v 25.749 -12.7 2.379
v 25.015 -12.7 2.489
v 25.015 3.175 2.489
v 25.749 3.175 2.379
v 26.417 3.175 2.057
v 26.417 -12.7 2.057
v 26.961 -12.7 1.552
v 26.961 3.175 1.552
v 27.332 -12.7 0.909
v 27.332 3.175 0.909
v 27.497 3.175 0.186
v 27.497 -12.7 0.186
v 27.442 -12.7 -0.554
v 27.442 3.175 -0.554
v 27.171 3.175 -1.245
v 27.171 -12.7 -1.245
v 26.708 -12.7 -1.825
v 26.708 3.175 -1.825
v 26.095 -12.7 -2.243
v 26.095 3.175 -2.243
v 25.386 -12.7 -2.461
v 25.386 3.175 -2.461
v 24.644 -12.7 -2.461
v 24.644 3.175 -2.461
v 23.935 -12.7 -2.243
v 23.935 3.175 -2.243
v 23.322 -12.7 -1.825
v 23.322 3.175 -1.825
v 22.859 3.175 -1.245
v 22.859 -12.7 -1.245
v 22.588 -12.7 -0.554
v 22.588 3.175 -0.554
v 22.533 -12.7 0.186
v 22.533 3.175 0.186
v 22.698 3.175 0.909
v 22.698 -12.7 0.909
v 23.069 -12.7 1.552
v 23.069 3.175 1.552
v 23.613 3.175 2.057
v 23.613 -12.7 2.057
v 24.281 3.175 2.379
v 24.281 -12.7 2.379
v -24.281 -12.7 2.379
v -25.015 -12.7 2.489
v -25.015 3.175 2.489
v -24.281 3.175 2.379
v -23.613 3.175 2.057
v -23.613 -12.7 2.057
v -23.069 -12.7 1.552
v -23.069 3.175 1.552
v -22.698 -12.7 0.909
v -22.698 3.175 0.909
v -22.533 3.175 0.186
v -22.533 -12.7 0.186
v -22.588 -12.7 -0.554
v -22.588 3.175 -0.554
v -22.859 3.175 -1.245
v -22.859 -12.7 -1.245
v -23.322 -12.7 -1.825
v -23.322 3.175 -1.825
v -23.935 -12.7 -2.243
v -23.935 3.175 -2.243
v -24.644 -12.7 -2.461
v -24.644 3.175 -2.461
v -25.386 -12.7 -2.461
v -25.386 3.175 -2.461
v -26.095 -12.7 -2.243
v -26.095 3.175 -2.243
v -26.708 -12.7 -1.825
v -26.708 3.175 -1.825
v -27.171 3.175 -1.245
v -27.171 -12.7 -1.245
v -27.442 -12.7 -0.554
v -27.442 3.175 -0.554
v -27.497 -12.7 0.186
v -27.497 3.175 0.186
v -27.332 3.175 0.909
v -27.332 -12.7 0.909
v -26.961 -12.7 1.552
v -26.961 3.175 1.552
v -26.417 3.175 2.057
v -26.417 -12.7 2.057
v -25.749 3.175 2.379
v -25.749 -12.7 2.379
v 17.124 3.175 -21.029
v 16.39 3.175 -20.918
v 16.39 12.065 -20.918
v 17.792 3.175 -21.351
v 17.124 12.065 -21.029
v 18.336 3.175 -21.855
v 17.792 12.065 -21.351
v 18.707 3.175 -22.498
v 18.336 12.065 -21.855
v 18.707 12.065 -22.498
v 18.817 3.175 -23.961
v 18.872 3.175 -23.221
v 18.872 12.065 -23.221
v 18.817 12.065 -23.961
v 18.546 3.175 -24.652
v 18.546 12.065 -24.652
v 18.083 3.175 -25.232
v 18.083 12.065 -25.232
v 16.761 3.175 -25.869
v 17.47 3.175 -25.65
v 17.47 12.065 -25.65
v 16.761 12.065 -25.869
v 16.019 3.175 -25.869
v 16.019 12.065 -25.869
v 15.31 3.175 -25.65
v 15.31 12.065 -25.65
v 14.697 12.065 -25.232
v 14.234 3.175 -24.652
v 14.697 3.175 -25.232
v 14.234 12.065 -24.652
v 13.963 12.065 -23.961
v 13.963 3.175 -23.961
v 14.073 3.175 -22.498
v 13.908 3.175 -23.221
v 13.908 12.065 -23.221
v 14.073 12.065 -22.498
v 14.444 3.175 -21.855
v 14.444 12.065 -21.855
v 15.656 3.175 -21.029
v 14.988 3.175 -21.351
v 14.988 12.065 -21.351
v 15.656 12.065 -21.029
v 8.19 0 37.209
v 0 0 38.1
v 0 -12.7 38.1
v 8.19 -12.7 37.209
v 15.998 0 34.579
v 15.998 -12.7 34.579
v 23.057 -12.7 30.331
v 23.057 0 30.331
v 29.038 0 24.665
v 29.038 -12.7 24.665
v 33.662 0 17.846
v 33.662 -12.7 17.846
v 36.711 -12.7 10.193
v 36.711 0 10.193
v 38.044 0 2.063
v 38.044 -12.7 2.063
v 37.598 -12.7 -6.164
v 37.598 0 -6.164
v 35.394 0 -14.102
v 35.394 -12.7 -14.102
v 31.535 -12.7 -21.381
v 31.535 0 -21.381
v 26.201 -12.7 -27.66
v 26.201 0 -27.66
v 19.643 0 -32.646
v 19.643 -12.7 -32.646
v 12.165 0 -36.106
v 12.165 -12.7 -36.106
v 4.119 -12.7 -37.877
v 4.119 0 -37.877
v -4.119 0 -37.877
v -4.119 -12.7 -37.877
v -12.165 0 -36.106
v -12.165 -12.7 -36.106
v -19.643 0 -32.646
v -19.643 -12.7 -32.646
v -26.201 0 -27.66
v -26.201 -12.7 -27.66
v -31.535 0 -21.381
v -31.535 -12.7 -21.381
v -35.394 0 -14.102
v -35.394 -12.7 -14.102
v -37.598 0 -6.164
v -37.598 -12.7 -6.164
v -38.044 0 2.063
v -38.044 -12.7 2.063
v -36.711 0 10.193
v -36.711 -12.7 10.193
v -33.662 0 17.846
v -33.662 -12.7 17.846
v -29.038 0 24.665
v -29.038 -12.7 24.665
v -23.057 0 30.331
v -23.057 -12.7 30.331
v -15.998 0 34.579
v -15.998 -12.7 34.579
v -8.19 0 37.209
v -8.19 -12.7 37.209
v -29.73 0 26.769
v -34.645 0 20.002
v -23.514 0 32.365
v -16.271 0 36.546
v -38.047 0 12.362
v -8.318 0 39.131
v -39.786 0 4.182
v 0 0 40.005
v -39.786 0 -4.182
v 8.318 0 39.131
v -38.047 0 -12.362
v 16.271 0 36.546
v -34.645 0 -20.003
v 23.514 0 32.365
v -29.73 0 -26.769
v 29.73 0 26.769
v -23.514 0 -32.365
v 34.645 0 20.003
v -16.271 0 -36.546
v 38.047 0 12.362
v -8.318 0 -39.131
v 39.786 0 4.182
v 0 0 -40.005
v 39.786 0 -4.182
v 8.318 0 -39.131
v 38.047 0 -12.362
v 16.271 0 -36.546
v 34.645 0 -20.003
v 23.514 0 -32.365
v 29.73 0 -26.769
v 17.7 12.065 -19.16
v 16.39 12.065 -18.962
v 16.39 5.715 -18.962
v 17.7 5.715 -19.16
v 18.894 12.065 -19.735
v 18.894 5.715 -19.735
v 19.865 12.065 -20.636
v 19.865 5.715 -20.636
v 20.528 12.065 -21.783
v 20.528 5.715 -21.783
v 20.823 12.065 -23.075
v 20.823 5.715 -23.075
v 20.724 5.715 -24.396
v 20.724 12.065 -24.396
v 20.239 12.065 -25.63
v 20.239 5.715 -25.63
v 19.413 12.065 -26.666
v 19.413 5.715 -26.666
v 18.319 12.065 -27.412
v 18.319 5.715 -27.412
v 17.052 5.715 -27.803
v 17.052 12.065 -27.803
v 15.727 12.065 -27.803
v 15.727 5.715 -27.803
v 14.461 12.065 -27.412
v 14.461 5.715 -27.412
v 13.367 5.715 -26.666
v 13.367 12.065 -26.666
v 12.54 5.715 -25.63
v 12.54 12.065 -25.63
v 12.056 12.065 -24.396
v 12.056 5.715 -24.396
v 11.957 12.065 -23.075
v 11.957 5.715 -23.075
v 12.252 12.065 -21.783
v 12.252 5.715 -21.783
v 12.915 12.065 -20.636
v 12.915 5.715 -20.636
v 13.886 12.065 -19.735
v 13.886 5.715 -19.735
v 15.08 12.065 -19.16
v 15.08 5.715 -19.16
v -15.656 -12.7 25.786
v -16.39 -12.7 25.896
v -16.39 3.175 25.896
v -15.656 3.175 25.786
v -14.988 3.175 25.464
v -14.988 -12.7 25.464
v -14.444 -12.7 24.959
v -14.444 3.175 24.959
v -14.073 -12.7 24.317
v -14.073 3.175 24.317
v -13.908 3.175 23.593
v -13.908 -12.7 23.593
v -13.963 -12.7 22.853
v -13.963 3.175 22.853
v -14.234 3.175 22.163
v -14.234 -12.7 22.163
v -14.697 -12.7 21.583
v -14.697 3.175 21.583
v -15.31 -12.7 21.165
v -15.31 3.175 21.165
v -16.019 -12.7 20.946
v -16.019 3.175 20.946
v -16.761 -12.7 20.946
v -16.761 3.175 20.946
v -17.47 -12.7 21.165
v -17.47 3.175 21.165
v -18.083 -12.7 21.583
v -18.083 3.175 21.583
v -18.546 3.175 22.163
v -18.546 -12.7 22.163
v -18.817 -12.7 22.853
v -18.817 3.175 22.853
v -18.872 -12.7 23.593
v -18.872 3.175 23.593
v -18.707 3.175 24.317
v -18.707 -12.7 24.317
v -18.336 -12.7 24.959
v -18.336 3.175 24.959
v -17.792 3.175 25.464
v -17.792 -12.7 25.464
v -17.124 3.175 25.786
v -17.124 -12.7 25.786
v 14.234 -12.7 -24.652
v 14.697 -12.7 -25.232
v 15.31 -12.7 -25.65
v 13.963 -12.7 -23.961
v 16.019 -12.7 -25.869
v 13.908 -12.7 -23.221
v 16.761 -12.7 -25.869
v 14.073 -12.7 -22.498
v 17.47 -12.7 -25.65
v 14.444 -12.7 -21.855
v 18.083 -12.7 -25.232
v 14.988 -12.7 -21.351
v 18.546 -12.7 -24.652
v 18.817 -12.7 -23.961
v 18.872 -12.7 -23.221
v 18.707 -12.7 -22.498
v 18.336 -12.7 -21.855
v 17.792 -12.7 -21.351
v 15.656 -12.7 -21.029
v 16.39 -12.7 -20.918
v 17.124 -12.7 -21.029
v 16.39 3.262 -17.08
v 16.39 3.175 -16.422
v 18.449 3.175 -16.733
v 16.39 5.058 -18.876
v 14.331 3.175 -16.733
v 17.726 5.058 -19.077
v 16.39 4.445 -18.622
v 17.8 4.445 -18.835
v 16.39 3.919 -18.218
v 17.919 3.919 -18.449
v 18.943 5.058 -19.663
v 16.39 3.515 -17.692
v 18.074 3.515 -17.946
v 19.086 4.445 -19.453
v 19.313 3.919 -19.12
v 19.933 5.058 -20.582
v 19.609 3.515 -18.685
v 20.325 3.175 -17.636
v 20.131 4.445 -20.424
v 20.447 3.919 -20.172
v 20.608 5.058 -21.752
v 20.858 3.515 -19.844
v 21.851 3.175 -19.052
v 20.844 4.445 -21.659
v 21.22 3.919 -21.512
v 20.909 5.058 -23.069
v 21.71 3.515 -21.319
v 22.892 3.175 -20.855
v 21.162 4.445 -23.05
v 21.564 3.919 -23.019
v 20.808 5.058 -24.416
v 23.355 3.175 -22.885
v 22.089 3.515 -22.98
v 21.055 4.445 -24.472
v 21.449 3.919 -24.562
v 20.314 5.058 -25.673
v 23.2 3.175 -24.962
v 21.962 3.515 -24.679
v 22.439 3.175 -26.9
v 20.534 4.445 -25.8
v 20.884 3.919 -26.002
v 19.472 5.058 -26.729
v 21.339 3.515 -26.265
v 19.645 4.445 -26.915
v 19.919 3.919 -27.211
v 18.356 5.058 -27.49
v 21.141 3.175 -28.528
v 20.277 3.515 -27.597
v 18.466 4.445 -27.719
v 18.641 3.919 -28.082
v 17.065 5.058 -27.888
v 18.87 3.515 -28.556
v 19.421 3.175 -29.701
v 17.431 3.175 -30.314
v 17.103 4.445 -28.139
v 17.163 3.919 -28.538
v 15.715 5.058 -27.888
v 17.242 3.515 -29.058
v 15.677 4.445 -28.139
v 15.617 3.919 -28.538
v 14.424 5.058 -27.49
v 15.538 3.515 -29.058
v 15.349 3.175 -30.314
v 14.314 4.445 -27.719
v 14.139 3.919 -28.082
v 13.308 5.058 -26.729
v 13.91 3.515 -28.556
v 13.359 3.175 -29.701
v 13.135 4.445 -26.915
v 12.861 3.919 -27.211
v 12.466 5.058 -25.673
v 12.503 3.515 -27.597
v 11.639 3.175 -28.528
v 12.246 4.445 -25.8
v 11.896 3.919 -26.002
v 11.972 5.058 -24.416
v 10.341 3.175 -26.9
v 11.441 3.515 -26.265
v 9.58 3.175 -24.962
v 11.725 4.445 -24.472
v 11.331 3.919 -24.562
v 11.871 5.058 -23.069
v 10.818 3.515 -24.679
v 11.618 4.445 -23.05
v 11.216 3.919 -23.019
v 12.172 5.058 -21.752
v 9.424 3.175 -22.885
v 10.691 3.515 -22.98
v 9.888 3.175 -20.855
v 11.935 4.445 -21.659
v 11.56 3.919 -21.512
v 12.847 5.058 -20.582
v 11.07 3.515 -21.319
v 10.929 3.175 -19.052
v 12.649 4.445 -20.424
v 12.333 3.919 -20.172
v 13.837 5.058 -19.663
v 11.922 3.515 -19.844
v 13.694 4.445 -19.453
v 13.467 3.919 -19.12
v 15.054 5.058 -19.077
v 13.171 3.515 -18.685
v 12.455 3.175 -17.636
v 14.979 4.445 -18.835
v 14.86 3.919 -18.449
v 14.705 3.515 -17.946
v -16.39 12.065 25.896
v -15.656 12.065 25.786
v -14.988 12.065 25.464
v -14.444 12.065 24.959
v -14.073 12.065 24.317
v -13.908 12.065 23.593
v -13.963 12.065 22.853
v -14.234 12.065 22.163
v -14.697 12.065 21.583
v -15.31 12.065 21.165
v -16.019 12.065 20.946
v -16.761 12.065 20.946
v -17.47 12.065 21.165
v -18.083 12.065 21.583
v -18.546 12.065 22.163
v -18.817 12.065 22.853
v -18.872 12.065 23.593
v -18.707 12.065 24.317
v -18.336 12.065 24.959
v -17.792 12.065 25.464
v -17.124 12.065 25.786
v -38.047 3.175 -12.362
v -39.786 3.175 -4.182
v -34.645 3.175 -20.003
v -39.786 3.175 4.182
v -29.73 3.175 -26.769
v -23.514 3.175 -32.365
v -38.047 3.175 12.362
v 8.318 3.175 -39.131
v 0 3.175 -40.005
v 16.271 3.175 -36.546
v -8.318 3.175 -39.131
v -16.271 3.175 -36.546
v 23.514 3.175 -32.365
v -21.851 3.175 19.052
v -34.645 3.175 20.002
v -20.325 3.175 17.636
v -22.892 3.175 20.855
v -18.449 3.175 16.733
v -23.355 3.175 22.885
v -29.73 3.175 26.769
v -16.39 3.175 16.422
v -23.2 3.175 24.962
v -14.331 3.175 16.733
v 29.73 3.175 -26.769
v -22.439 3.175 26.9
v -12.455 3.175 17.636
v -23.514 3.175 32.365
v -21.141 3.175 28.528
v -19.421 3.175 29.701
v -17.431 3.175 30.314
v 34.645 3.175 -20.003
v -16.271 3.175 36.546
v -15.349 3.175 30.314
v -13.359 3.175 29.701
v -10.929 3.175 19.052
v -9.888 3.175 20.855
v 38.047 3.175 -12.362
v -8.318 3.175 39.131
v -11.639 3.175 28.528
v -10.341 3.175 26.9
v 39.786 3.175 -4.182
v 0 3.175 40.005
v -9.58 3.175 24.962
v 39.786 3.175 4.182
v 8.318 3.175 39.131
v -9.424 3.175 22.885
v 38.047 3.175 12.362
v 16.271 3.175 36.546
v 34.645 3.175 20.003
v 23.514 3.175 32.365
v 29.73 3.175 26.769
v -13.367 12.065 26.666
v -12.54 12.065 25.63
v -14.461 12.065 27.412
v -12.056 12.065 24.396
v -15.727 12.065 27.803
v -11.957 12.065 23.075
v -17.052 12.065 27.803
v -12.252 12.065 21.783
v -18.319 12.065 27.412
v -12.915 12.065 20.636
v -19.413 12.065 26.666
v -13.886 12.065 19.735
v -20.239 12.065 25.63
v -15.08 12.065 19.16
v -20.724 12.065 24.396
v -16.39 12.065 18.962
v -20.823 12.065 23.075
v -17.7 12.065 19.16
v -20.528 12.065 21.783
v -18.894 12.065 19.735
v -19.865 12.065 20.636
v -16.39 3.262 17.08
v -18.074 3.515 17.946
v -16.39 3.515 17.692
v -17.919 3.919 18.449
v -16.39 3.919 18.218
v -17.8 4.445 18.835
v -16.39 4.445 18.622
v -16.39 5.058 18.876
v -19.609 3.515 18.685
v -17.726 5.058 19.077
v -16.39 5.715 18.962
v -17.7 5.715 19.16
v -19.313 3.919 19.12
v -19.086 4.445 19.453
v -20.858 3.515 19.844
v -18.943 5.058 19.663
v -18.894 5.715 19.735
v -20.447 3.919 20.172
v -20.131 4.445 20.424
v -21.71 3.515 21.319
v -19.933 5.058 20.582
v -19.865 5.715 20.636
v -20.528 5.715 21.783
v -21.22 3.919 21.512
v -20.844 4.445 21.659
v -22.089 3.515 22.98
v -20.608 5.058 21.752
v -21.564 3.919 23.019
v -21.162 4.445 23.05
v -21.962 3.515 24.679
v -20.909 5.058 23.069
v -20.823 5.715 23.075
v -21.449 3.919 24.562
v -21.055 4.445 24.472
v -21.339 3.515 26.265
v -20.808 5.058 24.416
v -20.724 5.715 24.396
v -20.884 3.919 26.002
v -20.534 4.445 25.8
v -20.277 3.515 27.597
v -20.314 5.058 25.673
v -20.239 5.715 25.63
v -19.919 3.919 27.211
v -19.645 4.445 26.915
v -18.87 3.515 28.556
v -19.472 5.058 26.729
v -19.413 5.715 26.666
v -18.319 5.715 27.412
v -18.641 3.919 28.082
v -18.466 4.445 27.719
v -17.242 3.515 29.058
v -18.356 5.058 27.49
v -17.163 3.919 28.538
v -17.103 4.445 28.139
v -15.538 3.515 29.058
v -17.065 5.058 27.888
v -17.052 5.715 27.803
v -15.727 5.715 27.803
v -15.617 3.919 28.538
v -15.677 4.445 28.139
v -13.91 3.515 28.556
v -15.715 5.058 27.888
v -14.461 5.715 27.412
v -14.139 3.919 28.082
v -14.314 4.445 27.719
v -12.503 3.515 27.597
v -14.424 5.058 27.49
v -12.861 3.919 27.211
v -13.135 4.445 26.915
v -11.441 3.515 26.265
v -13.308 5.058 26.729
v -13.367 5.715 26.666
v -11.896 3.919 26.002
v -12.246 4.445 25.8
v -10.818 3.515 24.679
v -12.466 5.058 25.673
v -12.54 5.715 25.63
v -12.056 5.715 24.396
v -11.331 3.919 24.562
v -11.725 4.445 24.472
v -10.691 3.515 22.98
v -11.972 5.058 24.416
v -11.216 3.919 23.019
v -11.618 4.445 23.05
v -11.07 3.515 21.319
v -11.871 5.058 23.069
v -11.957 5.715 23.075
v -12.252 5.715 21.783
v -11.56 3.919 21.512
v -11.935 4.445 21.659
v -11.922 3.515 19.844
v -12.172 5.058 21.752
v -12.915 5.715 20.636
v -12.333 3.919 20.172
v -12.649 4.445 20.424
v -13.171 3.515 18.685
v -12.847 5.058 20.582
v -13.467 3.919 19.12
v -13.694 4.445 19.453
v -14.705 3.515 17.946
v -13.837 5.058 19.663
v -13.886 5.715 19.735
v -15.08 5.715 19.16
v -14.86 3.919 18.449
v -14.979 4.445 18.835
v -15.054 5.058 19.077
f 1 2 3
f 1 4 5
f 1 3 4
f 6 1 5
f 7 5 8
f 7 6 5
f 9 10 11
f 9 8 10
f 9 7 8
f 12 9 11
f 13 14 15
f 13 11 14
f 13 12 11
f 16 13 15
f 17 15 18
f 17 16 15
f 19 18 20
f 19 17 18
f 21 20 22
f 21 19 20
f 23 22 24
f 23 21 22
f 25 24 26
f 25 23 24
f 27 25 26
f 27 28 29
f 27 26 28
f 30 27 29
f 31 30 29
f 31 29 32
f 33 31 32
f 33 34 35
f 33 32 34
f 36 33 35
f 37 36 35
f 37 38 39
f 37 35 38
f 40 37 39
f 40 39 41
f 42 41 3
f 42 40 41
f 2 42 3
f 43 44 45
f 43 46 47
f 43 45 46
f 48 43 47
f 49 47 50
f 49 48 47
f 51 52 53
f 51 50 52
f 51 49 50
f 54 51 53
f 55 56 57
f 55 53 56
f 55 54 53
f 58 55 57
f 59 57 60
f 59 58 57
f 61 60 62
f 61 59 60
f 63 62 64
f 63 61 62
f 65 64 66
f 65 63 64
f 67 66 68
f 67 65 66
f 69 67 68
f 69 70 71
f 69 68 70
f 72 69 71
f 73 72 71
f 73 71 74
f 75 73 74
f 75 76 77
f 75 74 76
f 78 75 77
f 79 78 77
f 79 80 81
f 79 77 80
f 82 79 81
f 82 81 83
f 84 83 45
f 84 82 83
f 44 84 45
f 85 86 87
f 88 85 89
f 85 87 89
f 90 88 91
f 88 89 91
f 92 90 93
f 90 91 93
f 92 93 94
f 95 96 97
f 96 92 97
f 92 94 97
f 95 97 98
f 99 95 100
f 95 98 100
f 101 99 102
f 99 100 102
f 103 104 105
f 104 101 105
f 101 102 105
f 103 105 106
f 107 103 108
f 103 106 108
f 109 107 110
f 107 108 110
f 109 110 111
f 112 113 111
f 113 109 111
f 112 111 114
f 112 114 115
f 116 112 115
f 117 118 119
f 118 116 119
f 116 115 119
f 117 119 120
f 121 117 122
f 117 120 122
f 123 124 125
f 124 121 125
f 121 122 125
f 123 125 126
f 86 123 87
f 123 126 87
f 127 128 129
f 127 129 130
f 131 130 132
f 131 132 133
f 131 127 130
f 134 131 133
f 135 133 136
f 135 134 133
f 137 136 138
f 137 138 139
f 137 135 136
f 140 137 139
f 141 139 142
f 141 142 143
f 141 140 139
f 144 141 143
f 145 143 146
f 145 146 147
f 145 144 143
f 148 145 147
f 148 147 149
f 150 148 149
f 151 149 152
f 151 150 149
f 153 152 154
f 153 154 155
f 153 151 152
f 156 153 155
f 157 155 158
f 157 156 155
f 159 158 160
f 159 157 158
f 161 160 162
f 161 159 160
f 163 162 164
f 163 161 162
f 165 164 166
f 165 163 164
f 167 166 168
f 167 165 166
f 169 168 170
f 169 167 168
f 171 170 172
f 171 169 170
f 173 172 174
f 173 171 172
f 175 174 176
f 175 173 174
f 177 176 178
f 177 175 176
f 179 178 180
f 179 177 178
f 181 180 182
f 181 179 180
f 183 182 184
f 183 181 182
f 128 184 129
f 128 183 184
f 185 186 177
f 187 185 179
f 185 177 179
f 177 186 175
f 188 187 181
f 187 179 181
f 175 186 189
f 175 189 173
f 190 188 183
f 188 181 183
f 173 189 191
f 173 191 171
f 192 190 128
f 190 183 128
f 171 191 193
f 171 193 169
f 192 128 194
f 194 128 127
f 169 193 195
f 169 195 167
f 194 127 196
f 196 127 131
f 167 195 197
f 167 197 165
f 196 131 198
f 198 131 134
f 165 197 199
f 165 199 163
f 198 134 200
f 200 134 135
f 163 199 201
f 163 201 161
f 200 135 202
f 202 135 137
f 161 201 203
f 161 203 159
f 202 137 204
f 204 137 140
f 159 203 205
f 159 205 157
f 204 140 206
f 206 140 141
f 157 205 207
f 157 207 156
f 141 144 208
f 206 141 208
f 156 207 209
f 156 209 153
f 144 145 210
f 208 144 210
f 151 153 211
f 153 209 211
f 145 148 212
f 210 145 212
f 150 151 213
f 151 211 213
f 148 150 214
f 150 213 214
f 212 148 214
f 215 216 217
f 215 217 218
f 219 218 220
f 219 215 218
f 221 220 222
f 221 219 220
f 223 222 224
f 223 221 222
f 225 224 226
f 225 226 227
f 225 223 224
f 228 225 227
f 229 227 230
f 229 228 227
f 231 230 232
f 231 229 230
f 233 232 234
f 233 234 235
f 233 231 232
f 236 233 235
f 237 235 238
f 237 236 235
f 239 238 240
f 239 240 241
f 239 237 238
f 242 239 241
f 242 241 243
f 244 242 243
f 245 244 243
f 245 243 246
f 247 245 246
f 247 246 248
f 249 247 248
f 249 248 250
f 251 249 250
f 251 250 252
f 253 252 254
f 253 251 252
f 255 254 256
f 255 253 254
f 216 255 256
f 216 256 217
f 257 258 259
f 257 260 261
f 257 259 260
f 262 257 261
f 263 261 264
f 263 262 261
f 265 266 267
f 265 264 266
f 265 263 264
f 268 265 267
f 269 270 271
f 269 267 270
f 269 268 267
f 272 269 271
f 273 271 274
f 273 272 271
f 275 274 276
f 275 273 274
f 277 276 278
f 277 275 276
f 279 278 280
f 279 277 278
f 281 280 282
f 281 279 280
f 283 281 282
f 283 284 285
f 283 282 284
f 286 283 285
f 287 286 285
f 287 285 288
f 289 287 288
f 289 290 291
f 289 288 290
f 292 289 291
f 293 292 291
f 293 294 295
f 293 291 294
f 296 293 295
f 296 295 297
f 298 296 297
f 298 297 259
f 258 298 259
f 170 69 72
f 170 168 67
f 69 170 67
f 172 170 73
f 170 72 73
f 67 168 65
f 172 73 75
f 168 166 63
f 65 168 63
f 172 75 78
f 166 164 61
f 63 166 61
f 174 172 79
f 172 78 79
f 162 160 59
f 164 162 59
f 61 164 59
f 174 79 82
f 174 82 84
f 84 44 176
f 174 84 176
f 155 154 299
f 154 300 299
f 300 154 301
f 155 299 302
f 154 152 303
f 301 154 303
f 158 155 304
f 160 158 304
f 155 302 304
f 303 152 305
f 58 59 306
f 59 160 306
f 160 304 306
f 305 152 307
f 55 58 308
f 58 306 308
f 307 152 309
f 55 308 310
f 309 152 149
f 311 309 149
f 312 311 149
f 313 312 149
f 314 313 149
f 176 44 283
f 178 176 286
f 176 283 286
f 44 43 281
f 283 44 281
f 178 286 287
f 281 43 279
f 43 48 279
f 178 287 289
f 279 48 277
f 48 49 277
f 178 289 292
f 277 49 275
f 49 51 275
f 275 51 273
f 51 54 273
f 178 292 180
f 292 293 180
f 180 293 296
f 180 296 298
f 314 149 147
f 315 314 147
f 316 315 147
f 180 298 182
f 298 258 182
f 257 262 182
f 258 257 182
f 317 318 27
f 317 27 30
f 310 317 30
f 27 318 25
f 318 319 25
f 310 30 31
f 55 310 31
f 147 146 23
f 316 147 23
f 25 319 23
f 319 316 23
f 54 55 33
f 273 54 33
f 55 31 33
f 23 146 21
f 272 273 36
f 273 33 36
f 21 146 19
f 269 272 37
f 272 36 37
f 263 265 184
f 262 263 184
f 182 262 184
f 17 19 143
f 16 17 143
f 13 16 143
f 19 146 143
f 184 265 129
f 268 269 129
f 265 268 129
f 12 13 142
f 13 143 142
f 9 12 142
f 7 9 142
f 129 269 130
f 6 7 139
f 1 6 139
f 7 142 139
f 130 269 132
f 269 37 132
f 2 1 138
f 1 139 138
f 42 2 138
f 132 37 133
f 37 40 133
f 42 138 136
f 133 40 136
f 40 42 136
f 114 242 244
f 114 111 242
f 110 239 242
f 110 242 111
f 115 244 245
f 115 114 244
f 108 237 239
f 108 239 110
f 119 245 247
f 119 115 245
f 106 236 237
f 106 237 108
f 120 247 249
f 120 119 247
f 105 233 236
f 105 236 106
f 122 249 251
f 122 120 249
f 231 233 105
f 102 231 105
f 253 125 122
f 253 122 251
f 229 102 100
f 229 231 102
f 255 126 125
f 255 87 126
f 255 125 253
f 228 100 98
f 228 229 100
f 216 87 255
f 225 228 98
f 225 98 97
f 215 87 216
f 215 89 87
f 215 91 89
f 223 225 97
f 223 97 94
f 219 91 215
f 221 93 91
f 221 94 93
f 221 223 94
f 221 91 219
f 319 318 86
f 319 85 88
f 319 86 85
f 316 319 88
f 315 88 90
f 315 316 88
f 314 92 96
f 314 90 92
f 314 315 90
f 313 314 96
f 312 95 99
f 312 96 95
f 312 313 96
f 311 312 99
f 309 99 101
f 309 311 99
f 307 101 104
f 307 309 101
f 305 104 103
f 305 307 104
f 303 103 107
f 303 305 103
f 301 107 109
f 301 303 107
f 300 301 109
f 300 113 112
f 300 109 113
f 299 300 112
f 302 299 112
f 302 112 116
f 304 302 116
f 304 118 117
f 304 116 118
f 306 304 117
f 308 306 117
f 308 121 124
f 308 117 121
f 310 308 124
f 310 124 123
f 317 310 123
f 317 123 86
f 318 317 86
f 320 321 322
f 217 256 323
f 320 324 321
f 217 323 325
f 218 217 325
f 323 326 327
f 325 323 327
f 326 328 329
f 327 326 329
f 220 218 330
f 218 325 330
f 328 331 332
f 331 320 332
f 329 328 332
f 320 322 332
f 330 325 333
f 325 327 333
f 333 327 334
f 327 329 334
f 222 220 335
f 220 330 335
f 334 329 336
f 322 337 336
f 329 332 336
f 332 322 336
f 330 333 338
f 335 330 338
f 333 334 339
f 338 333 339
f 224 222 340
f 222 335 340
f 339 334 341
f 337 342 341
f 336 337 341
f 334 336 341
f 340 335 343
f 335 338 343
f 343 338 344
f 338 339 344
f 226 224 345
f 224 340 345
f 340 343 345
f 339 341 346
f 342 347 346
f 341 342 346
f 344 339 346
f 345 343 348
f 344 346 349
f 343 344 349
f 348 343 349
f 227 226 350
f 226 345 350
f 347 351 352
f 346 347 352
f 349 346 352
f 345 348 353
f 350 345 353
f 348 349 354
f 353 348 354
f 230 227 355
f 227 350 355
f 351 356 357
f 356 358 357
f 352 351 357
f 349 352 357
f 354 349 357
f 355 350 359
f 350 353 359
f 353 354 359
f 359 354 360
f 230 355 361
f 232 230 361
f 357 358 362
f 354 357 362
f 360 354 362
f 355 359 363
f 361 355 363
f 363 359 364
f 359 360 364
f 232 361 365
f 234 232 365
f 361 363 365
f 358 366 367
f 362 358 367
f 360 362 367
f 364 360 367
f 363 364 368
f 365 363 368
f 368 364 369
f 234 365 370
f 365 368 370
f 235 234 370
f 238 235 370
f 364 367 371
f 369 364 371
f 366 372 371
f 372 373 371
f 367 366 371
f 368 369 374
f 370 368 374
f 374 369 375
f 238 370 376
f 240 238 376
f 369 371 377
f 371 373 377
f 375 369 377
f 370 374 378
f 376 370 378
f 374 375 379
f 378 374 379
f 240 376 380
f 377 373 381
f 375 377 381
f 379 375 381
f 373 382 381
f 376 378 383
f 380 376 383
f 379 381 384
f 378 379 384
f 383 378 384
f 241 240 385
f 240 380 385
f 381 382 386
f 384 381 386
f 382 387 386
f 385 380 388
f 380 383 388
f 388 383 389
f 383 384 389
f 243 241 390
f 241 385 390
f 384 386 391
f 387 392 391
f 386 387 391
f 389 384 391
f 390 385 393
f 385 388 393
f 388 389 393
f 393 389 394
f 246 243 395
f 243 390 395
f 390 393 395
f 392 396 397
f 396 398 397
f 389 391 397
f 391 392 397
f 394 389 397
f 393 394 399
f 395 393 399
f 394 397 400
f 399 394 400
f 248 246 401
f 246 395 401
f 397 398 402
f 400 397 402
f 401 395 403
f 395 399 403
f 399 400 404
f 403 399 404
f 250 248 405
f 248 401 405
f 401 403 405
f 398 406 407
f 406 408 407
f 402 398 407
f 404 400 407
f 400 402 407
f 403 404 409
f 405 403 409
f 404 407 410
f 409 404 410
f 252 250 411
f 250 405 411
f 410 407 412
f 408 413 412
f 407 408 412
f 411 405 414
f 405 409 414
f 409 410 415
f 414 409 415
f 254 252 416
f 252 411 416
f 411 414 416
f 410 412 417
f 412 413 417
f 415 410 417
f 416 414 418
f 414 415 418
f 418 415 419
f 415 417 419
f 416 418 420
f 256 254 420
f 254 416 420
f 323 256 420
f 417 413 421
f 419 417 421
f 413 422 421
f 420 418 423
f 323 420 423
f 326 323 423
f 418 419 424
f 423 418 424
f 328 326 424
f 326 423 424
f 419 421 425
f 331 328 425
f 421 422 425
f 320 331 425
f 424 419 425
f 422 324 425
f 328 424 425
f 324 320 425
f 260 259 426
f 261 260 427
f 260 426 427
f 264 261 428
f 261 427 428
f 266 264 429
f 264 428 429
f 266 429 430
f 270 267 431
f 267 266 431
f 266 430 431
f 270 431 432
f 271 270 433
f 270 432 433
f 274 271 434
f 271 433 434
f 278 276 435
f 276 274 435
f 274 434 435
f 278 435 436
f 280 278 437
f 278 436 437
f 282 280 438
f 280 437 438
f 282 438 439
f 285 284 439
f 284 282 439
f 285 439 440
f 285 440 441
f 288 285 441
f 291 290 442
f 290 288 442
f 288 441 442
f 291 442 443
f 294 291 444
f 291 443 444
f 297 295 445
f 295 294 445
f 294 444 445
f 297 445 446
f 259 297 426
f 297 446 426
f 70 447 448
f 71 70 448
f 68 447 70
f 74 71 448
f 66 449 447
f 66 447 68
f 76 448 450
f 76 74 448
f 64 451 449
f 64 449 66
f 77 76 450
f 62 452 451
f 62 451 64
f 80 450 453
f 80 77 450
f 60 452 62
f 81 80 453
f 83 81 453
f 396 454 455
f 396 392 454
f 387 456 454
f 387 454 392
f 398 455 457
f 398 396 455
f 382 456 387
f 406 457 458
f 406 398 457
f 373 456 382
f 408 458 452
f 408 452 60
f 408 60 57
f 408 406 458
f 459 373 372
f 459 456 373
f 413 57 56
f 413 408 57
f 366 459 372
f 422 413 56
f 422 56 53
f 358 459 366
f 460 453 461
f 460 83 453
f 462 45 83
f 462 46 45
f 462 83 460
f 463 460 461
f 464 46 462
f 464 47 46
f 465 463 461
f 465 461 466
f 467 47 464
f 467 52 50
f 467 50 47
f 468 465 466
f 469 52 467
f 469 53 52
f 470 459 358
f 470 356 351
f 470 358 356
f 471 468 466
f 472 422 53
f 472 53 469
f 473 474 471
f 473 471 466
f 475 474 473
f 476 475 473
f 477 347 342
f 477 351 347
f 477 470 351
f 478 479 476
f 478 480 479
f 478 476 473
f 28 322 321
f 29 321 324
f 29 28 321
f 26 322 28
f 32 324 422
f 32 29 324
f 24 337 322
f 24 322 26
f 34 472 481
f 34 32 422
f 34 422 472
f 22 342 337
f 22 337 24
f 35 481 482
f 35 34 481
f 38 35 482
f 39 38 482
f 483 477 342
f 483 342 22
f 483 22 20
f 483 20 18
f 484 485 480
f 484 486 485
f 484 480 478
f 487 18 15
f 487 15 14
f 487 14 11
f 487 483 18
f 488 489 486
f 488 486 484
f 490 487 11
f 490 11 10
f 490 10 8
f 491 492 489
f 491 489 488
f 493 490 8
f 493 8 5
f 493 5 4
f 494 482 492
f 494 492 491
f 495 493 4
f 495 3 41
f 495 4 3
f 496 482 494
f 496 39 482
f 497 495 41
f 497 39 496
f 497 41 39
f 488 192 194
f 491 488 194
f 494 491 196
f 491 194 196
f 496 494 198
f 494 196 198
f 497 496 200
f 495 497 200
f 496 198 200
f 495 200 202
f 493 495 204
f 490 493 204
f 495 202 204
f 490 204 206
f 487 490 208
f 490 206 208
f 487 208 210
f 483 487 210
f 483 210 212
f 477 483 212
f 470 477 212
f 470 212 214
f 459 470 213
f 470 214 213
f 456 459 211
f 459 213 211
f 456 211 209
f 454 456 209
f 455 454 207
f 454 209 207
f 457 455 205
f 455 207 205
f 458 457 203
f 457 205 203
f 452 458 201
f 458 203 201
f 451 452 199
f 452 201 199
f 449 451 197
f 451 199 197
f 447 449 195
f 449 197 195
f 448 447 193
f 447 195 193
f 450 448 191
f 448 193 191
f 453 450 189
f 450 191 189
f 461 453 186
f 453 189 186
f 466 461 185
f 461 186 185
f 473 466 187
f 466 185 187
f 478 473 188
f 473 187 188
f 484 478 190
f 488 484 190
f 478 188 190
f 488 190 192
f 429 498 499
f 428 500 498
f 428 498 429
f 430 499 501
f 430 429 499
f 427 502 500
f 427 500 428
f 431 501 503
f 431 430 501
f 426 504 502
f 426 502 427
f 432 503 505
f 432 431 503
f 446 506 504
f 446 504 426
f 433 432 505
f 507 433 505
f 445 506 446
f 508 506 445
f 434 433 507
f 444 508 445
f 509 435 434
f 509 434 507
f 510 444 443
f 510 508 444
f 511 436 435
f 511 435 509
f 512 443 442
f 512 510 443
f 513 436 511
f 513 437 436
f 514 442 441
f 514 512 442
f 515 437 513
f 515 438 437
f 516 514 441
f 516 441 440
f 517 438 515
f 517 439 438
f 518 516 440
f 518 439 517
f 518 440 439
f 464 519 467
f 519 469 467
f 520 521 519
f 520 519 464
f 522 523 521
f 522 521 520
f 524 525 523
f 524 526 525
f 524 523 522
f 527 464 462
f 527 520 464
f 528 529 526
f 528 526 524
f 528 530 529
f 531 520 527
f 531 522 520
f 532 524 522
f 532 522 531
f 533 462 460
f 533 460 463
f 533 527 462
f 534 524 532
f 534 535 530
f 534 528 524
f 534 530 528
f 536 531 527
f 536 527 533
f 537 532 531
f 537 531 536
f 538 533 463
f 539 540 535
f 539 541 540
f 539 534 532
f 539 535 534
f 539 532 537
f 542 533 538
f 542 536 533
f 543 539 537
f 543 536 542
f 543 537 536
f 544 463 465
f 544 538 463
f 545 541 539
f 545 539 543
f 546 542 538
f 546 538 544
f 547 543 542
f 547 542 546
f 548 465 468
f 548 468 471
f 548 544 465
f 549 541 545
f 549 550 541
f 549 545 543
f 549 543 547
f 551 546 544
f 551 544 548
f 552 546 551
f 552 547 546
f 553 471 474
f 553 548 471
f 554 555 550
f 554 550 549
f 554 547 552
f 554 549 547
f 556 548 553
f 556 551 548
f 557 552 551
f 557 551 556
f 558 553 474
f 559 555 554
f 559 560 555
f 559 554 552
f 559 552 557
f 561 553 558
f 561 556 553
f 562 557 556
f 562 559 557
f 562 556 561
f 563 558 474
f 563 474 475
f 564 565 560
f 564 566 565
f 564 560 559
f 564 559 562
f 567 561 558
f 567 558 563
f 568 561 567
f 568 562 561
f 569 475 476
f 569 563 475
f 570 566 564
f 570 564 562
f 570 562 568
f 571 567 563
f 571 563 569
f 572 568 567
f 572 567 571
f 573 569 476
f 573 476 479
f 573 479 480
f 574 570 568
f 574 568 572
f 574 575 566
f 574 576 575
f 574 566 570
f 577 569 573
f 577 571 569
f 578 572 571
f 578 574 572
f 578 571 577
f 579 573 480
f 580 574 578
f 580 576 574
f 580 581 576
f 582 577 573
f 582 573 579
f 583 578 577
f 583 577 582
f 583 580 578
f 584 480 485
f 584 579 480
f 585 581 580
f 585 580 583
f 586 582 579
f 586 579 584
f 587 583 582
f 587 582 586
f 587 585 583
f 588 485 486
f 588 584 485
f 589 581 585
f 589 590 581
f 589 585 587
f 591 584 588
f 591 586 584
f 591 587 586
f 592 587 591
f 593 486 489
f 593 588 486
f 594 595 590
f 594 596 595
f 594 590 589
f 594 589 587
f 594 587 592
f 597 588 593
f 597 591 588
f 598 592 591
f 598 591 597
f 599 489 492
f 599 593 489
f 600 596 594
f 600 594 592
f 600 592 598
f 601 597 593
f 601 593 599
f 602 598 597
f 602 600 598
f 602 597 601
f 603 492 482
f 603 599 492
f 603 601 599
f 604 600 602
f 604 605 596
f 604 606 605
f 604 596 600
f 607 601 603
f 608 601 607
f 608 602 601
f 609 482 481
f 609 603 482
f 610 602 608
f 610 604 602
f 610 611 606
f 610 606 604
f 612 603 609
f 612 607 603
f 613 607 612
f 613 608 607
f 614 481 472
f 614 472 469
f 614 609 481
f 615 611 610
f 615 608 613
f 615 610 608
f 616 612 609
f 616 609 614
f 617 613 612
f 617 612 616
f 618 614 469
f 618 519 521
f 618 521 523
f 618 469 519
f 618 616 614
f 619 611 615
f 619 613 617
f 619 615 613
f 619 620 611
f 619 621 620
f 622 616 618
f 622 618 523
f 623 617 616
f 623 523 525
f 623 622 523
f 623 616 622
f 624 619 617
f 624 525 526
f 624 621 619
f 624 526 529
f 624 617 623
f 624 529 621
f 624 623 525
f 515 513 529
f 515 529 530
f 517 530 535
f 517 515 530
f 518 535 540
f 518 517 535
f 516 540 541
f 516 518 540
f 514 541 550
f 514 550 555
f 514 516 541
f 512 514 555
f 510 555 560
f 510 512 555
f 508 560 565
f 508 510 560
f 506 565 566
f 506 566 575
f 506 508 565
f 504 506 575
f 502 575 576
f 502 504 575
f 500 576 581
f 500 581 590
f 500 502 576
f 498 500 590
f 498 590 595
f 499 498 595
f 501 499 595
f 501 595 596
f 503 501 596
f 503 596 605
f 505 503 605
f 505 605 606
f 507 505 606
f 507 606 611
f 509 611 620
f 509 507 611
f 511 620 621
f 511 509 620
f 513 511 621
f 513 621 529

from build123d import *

# Parameters (mm, degrees)
SKETCH1_R               = 40.005
BOSS_EXTRUDE1_DEPTH     = 3.175
SKETCH1_3_R             = 38.1
BOSS_EXTRUDE2_DEPTH     = 12.7
CUT_EXTRUDE1_DEPTH      = 59.760664351
CUT_EXTRUDE1_DEPTH_BACK = 59.760664351
SKETCH3_R               = 2.4892
CUT_EXTRUDE2_DEPTH      = 59.760664351
CUT_EXTRUDE2_DEPTH_BACK = 59.760664351
SKETCH4_R               = 2.4892
BOSS_EXTRUDE3_START     = 8.89
SKETCH4_3_R             = 4.445
SKETCH4_3_R_2           = 2.4892
BOSS_EXTRUDE3_DEPTH     = 8.89
FILLET1_R               = 2.54


with BuildPart() as part:
    # Sketch1 → Boss-Extrude1 (new body)
    with BuildSketch(Plane(origin=(0, 0, 0), x_dir=(1, 0, 0), z_dir=(0, 1, 0))):
        Circle(SKETCH1_R)
    extrude(amount=BOSS_EXTRUDE1_DEPTH)

    # Sketch1<3> → Boss-Extrude2 (add)
    with BuildSketch(Plane(origin=(0, 0, 0), x_dir=(1, 0, 0), z_dir=(0, 1, 0))):
        Circle(SKETCH1_3_R)
    extrude(amount=-BOSS_EXTRUDE2_DEPTH)

    # Sketch3 → Cut-Extrude1 (cut, two sides: drawn at the far end of the back side and taken through both)
    with BuildSketch(Plane(origin=(0, 3.175, 0), x_dir=(1, 0, 0), z_dir=(0, 1, 0)).offset(-CUT_EXTRUDE1_DEPTH_BACK)):
        with Locations((-25.015, 0)):
            Circle(SKETCH3_R)
        with Locations((25.015, 0)):
            Circle(SKETCH3_R)
    extrude(amount=CUT_EXTRUDE1_DEPTH + CUT_EXTRUDE1_DEPTH_BACK, mode=Mode.SUBTRACT)

    # Sketch4 → Cut-Extrude2 (cut, two sides: drawn at the far end of the back side and taken through both)
    with BuildSketch(Plane(origin=(0, 3.175, 0), x_dir=(1, 0, 0), z_dir=(0, 1, 0)).offset(-CUT_EXTRUDE2_DEPTH_BACK)):
        with Locations((16.389946669, 23.407269666)):
            Circle(SKETCH4_R)
        with Locations((-16.389946669, -23.407269666)):
            Circle(SKETCH4_R)
    extrude(amount=CUT_EXTRUDE2_DEPTH + CUT_EXTRUDE2_DEPTH_BACK, mode=Mode.SUBTRACT)

    # Sketch4<3> → Boss-Extrude3 (add)
    # profile 1 of 2: a face of its own
    with BuildSketch(Plane(origin=(0, 3.175, 0), x_dir=(1, 0, 0), z_dir=(0, 1, 0)).offset(BOSS_EXTRUDE3_START)):
        with Locations((16.389946669, 23.407269666)):
            Circle(SKETCH4_3_R)
        with Locations((16.389946669, 23.407269666)):
            Circle(SKETCH4_3_R_2, mode=Mode.SUBTRACT)
    # profile 2 of 2: a face of its own
    with BuildSketch(Plane(origin=(0, 3.175, 0), x_dir=(1, 0, 0), z_dir=(0, 1, 0)).offset(BOSS_EXTRUDE3_START)):
        with Locations((-16.389946669, -23.407269666)):
            Circle(SKETCH4_3_R)
        with Locations((-16.389946669, -23.407269666)):
            Circle(SKETCH4_3_R_2, mode=Mode.SUBTRACT)
    extrude(amount=-BOSS_EXTRUDE3_DEPTH)

    # Fillet1
    fillet1_edges = [part.edges().sort_by_distance(p)[0] for p in [
        (11.944946669, 3.175, -23.407269666),
        (-20.834946669, 3.175, 23.407269666),
    ]]
    fillet(fillet1_edges, radius=FILLET1_R)


solid = part.part
